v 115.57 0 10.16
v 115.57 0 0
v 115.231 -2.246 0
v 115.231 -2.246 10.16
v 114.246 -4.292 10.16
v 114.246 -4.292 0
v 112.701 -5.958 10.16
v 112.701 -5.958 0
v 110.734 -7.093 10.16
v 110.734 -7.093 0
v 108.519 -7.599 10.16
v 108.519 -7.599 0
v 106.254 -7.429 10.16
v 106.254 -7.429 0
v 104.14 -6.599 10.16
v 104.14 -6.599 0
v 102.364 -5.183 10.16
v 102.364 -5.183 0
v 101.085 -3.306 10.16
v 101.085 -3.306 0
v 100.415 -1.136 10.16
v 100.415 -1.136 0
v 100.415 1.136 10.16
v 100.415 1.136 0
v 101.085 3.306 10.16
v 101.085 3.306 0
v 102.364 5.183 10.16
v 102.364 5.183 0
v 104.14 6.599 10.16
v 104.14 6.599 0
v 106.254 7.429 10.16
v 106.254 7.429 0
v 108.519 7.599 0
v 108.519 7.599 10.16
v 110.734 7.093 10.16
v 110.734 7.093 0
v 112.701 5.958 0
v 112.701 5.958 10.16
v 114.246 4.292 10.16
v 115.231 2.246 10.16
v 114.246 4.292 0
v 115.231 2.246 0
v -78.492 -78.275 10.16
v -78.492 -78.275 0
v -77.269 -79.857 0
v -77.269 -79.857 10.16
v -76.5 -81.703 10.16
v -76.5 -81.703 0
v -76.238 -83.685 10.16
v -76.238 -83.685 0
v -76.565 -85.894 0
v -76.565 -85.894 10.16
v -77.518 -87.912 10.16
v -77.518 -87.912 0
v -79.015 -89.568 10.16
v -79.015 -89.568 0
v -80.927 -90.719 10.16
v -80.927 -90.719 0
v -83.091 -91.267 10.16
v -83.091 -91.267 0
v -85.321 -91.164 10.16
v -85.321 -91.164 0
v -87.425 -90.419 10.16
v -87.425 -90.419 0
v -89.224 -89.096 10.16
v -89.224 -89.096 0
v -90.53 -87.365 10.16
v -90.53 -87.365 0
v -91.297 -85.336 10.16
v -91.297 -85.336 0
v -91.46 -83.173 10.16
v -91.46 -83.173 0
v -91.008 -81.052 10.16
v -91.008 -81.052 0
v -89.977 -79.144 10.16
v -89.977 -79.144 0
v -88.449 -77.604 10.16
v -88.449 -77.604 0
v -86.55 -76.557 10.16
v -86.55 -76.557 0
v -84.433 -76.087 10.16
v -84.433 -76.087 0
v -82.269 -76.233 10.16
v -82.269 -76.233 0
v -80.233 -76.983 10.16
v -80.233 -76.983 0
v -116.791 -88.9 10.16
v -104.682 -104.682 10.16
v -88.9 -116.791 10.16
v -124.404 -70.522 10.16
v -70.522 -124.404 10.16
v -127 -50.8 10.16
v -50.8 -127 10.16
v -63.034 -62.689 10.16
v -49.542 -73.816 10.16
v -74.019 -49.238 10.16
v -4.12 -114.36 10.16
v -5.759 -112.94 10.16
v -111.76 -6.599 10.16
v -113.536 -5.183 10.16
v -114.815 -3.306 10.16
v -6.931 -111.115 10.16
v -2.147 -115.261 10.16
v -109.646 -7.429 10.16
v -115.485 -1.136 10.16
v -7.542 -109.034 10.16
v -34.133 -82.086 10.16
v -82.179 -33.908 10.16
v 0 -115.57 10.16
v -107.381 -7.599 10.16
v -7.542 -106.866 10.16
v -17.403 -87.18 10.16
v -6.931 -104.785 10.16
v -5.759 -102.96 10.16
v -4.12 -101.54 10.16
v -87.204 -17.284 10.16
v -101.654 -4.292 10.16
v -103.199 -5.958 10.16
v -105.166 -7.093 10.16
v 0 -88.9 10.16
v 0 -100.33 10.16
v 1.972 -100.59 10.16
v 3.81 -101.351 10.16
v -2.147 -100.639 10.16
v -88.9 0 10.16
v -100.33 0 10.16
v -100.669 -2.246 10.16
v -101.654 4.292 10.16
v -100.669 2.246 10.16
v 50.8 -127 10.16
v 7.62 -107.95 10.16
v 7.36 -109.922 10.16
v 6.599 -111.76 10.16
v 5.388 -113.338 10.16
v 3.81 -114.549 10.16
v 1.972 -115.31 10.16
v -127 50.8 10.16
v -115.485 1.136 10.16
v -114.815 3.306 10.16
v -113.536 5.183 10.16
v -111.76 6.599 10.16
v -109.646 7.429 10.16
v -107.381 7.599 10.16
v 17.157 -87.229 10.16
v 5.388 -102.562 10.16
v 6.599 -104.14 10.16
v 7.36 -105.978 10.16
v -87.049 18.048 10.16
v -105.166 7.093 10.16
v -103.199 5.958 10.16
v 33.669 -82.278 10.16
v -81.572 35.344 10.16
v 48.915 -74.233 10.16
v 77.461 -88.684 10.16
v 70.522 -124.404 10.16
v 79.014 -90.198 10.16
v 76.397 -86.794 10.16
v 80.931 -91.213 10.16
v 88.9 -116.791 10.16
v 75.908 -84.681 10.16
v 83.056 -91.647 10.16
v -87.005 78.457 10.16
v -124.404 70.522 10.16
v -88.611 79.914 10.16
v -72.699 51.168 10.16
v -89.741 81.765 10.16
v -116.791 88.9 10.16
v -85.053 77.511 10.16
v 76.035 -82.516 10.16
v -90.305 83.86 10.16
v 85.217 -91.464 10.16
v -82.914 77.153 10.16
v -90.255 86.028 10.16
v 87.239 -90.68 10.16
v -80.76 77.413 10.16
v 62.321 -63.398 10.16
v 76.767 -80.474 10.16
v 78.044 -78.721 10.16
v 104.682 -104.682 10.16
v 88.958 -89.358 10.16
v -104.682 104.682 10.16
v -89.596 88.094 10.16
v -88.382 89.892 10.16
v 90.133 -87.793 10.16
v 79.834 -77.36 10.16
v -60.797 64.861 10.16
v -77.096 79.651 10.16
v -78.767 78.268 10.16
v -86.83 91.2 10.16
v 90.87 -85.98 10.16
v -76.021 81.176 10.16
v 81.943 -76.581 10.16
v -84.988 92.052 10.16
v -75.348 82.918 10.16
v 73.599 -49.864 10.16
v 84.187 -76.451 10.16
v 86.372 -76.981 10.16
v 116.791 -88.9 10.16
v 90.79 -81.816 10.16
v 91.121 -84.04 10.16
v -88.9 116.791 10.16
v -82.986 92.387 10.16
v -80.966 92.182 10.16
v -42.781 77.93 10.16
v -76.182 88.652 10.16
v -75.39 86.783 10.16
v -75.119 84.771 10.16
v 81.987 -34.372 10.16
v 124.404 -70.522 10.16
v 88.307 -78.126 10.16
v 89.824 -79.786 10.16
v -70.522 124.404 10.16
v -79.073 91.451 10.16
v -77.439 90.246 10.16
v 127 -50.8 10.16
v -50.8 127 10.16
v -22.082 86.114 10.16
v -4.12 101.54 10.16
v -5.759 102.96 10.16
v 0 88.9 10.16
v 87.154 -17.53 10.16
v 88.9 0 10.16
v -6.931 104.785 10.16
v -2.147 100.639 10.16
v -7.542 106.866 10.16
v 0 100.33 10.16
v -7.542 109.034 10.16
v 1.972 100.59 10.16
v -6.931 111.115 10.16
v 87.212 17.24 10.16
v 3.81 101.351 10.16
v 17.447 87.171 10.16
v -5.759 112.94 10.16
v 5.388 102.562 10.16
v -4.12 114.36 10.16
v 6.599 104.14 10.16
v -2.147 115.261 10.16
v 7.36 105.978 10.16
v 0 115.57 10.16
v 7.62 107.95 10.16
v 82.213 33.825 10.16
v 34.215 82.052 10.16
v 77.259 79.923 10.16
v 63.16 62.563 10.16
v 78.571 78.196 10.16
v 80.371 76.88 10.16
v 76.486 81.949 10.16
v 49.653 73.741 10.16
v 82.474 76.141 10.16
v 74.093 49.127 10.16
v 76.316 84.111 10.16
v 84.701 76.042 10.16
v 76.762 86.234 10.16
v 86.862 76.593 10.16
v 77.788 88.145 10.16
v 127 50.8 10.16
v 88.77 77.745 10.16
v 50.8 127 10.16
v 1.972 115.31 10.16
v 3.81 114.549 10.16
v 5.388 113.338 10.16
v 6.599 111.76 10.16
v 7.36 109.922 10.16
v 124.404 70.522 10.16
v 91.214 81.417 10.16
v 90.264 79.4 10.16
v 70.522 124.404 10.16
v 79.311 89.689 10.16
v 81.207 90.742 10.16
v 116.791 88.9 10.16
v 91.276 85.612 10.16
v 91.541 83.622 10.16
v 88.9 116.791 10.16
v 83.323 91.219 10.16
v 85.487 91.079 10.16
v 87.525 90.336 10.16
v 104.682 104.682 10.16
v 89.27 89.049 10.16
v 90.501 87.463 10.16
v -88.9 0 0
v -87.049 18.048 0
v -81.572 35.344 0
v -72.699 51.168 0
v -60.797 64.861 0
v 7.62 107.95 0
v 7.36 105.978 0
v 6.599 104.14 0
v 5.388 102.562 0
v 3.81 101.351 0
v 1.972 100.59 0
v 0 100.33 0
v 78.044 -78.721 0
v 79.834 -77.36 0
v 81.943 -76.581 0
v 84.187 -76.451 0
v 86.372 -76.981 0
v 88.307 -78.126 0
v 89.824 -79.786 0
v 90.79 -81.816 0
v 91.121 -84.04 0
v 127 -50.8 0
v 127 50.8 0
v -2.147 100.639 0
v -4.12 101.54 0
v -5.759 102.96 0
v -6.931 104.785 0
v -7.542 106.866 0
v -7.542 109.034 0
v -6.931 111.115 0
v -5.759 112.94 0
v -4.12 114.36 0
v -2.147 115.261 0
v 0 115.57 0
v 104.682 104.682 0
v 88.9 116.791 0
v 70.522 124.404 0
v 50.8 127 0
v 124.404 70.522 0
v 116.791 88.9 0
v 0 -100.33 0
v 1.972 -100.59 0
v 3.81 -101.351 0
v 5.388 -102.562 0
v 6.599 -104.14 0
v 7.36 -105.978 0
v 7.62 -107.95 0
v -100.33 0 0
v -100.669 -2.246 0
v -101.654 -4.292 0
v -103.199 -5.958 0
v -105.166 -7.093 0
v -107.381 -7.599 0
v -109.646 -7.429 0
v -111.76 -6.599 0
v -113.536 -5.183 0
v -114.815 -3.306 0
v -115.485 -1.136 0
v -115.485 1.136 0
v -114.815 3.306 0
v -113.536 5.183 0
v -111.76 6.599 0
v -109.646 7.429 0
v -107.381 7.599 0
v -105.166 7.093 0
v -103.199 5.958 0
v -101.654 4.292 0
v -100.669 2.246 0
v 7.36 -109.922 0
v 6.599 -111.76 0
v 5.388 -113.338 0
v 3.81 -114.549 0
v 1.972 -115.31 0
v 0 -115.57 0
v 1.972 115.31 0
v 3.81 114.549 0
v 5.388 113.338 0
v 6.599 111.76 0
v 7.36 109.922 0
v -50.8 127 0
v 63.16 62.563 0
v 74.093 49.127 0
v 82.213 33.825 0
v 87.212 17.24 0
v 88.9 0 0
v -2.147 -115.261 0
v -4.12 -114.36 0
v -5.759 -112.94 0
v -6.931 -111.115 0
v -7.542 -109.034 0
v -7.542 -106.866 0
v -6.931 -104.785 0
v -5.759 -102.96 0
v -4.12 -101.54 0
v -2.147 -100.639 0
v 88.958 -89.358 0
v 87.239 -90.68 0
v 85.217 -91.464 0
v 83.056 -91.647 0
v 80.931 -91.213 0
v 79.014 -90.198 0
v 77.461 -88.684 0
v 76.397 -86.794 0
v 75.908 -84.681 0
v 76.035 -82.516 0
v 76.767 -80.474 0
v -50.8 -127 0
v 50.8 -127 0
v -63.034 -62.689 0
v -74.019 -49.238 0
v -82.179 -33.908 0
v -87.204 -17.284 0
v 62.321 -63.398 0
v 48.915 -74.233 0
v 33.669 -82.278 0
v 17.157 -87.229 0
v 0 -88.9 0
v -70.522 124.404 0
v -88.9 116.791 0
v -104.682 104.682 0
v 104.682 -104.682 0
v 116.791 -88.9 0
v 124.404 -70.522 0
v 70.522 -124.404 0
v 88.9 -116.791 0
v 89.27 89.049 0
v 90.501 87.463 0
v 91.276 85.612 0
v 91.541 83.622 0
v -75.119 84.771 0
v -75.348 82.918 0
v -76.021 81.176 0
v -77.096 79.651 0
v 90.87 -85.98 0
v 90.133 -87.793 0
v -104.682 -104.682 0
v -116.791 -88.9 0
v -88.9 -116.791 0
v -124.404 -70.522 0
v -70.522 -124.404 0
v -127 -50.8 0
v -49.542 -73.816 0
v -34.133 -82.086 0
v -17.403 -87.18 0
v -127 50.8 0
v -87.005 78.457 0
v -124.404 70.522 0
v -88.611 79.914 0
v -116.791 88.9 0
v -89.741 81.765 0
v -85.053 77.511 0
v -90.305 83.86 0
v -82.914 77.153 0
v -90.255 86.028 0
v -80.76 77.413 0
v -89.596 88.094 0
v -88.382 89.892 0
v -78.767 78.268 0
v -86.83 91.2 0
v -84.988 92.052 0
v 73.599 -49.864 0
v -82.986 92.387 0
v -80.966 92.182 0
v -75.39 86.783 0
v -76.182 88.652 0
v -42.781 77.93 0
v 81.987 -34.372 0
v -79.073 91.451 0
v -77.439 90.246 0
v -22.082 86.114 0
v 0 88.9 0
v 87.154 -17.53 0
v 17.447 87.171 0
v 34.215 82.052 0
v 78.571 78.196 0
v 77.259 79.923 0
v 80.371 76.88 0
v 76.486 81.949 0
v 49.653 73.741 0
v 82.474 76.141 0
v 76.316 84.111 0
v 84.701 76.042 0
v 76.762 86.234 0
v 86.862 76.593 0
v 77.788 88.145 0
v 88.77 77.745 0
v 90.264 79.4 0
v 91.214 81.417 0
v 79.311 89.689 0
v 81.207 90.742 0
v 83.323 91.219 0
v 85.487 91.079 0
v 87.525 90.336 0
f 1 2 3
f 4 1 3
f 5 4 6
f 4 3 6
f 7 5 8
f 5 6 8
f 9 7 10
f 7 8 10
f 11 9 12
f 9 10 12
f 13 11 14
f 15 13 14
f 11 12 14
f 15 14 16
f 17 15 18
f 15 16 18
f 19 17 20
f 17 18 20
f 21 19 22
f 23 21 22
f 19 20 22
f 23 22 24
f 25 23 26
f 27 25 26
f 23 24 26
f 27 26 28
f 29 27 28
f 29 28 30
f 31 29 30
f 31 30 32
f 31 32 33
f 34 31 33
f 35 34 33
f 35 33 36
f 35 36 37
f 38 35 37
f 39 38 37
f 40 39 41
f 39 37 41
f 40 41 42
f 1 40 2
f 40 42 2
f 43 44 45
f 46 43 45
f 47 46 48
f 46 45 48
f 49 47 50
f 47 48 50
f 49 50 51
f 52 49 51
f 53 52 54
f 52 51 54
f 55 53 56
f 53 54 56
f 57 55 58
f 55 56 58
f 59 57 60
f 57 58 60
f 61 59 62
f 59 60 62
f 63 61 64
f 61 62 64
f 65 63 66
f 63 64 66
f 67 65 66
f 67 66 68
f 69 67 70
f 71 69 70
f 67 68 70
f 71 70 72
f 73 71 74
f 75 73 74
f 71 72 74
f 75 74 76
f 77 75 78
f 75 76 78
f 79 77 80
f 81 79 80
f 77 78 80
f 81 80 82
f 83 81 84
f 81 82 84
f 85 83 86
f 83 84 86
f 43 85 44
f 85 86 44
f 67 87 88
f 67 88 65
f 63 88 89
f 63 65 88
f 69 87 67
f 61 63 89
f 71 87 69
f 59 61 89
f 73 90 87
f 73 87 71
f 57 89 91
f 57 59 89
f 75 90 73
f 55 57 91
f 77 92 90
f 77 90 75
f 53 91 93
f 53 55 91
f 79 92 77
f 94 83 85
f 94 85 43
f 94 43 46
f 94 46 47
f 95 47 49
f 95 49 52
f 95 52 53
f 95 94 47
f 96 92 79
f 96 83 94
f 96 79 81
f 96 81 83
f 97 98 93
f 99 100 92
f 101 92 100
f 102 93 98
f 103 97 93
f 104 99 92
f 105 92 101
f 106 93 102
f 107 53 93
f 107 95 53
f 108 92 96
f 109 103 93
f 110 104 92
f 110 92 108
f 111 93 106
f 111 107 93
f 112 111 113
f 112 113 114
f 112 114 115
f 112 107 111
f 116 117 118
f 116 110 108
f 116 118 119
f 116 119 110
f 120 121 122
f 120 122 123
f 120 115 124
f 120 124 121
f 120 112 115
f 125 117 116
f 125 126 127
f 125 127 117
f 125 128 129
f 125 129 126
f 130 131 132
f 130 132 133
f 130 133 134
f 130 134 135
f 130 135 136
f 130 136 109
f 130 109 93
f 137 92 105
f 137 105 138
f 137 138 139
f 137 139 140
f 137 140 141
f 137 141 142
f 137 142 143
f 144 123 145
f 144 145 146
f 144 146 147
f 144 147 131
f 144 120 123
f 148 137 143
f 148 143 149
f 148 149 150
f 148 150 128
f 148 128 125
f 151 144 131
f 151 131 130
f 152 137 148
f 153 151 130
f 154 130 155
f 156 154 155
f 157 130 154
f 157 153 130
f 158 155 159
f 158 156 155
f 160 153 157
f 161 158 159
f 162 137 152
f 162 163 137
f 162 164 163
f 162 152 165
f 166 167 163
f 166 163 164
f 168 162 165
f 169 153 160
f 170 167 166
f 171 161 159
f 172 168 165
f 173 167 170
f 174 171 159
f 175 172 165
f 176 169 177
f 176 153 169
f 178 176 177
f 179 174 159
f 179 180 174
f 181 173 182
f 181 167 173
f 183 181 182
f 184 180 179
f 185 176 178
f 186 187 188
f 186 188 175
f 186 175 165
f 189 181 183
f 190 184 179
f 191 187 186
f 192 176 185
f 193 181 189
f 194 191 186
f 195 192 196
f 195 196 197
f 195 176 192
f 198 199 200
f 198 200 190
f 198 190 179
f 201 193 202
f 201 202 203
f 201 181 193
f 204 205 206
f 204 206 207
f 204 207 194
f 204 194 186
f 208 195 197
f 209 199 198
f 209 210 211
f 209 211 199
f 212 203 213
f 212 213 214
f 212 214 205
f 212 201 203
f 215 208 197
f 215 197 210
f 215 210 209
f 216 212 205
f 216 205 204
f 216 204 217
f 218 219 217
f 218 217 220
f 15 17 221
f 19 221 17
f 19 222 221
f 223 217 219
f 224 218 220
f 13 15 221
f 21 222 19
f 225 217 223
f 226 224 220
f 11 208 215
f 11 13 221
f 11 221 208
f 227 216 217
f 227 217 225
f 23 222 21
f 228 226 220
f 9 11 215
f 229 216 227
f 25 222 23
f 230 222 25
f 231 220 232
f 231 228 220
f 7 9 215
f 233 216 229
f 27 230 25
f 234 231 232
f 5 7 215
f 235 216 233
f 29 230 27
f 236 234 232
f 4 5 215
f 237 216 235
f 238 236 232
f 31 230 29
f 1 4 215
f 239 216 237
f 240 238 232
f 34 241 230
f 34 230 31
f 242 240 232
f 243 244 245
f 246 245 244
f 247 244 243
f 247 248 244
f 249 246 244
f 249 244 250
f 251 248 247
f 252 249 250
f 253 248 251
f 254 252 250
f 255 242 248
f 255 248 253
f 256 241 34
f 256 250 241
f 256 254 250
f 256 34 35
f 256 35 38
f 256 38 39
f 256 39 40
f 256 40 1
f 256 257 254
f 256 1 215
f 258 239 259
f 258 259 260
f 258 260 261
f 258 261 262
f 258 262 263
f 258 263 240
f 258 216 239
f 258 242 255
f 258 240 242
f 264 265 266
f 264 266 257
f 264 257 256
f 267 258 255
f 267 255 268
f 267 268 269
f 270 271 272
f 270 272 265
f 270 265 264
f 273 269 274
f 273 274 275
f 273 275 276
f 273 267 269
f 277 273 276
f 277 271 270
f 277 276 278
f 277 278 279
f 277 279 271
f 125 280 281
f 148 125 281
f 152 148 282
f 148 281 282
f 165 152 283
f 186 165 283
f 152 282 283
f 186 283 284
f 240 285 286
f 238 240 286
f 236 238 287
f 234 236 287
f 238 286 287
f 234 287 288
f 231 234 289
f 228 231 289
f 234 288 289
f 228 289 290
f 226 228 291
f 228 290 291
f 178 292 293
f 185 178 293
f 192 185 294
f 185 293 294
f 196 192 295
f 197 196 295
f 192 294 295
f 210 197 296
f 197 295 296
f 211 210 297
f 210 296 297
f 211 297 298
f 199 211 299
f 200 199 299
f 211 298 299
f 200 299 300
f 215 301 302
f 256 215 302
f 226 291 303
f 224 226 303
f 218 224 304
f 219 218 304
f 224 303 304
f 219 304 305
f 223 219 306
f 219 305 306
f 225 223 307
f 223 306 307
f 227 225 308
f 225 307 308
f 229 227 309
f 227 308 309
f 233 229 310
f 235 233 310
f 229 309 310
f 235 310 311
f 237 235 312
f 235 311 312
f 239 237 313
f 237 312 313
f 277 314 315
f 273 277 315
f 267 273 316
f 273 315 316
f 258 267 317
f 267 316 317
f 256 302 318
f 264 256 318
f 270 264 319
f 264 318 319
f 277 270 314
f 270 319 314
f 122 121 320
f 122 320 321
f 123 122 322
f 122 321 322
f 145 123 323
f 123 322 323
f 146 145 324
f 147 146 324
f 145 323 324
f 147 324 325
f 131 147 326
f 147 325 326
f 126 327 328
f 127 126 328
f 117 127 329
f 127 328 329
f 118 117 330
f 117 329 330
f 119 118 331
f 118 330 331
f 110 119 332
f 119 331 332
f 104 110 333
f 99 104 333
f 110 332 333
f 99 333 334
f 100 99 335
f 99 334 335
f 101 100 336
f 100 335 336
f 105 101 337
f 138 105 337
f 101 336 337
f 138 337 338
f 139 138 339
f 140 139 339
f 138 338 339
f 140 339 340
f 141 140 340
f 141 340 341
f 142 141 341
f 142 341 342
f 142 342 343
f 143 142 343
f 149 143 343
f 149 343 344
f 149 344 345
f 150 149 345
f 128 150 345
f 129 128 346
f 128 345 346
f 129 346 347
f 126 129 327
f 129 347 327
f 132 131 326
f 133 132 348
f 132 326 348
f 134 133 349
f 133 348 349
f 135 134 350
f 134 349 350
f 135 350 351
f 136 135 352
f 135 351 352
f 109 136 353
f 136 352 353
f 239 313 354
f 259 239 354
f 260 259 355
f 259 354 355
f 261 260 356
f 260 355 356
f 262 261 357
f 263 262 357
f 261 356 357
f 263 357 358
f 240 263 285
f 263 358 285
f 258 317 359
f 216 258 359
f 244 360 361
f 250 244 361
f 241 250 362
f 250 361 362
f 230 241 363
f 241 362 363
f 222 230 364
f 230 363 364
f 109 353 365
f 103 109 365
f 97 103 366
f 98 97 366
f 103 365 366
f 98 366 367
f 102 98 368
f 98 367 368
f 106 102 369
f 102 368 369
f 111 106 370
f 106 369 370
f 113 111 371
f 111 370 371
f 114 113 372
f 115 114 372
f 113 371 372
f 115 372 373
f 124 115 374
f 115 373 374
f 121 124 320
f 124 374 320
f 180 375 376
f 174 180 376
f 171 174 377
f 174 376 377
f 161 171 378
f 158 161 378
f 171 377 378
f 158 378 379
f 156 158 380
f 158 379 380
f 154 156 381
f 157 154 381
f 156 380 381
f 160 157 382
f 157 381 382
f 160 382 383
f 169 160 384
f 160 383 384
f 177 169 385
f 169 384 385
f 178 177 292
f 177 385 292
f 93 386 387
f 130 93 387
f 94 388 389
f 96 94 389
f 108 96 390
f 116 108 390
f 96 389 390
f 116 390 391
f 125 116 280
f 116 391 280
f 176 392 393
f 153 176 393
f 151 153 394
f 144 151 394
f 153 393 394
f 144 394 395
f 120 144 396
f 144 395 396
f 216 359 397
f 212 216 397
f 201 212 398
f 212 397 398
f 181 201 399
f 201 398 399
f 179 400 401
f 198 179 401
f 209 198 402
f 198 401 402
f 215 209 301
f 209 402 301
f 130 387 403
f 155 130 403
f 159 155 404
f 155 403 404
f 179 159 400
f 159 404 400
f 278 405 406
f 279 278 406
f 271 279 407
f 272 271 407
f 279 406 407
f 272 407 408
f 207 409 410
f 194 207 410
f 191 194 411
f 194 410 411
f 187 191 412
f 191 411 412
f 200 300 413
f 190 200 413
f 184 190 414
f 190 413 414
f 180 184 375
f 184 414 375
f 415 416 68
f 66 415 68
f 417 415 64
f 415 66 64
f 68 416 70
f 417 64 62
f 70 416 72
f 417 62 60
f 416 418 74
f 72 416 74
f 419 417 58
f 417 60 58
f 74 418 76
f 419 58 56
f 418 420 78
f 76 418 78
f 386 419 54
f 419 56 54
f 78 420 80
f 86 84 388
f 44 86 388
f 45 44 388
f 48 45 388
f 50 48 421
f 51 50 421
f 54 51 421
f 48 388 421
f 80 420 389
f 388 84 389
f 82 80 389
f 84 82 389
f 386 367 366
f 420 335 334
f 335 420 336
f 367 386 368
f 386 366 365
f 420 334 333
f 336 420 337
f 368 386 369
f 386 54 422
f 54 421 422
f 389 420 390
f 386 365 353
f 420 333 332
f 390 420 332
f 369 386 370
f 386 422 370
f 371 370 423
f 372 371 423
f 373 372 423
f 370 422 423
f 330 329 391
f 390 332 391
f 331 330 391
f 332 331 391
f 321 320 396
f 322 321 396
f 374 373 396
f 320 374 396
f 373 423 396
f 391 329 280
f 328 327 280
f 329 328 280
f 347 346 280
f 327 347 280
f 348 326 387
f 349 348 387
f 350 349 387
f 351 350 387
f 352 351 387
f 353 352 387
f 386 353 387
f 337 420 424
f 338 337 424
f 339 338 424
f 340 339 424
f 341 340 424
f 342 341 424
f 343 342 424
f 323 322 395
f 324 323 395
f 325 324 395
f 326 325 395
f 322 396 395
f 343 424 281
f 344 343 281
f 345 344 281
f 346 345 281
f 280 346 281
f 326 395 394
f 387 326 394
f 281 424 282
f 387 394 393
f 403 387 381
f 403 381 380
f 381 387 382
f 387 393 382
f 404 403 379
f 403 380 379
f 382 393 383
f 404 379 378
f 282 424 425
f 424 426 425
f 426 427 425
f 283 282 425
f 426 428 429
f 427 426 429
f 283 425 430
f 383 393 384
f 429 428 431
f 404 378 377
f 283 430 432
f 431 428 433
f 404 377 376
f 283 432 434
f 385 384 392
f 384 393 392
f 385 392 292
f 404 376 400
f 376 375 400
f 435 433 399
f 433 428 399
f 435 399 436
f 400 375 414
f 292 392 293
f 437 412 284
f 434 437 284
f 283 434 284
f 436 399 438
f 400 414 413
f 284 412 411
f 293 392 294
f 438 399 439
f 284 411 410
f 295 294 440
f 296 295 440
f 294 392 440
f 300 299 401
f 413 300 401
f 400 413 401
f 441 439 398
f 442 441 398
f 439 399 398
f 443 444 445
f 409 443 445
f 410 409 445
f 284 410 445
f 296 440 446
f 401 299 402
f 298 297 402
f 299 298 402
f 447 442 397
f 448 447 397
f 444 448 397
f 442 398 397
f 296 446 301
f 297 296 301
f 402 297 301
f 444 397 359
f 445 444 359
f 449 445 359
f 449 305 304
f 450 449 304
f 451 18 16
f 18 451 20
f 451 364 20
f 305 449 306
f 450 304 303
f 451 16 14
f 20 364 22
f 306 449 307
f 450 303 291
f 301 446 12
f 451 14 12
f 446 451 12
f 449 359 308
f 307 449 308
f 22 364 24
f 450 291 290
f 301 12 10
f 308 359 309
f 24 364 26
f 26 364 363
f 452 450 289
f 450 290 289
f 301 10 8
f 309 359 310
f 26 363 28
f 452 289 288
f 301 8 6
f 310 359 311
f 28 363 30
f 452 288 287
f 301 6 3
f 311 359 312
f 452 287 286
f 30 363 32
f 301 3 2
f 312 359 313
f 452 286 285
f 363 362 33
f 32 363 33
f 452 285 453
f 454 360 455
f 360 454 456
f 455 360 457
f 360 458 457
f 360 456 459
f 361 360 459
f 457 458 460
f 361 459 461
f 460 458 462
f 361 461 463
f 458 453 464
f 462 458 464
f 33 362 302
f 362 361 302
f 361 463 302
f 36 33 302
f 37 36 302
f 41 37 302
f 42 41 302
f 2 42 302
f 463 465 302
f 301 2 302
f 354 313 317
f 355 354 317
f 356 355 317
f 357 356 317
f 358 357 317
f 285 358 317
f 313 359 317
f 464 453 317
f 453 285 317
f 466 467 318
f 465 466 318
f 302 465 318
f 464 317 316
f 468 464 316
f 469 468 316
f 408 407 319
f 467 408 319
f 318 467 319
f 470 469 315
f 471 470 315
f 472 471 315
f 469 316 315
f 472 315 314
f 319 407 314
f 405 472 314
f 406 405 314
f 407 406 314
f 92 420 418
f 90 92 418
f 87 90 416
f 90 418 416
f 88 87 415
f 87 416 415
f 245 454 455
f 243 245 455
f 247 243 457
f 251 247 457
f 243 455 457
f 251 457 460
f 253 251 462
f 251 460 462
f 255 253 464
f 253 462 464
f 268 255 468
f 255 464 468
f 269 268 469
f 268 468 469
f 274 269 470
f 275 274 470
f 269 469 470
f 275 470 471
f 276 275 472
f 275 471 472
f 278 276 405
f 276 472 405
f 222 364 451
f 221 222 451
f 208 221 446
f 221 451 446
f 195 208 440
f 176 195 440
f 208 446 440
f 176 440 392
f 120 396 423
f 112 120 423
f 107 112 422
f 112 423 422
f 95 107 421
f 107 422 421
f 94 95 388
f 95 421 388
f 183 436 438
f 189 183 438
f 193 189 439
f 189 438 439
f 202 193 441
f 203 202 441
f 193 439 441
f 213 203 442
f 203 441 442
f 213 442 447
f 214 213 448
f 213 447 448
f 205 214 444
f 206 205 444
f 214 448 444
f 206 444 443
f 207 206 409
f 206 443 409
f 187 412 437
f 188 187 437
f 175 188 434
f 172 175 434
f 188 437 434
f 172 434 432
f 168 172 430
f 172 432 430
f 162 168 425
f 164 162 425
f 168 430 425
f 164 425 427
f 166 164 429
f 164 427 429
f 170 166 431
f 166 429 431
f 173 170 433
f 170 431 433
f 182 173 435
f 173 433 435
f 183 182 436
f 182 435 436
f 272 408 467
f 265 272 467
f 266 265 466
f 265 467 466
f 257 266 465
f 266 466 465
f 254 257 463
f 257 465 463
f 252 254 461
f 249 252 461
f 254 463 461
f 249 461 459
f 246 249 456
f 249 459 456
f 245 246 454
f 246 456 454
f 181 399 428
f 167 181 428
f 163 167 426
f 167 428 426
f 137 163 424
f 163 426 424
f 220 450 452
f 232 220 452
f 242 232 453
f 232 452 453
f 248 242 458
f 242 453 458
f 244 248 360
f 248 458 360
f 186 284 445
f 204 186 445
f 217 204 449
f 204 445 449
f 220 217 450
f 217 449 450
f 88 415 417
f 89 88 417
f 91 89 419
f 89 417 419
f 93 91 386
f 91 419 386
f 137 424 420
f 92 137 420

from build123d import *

# Parameters (mm, degrees)
F1_DEPTH = 10.16


with BuildPart() as f1:
    # F0 (on Top) → F1 (new body)
    with BuildSketch(Plane.XY):
        with BuildLine():
            Line((-127, 50.8), (-127, 0))
            Line((-127, 0), (-115.57, 0))
            ThreePointArc((-115.57, 0), (-107.95, 7.62), (-100.33, 0))
            Line((-100.33, 0), (-88.9, 0))
            ThreePointArc((-88.9, 0), (-81.572297, 35.343604), (-60.79718, 64.860719))
            Line((-60.79718, 64.860719), (-77.096278, 79.650577))
            ThreePointArc((-77.096278, 79.650577), (-87.859909, 79.128047), (-88.382439, 89.891679))
            Line((-88.382439, 89.891679), (-104.681537, 104.681537))
            ThreePointArc((-104.681537, 104.681537), (-121.19962, 79.960478), (-127, 50.8))
        make_face()
        with BuildLine():
            ThreePointArc((-50.8, 127), (-79.960478, 121.19962), (-104.681537, 104.681537))
            Line((-104.681537, 104.681537), (-88.382439, 89.891679))
            ThreePointArc((-88.382439, 89.891679), (-79.994898, 91.879738), (-75.119358, 84.771128))
            ThreePointArc((-75.119358, 84.771128), (-75.630748, 82.026668), (-77.096278, 79.650577))
            Line((-77.096278, 79.650577), (-60.79718, 64.860719))
            ThreePointArc((-60.79718, 64.860719), (-32.688622, 82.672027), (0, 88.9))
            Line((0, 88.9), (0, 100.33))
            ThreePointArc((0, 100.33), (-7.62, 107.95), (0, 115.57))
            Line((0, 115.57), (0, 127))
            Line((0, 127), (-50.8, 127))
        make_face()
        with BuildLine():
            Line((89.270123, 89.048531), (104.681537, 104.681537))
            ThreePointArc((104.681537, 104.681537), (79.960478, 121.19962), (50.8, 127))
            Line((50.8, 127), (0, 127))
            Line((0, 127), (0, 115.57))
            ThreePointArc((0, 115.57), (5.388154, 113.338154), (7.62, 107.95))
            ThreePointArc((7.62, 107.95), (5.388154, 102.561846), (0, 100.33))
            Line((0, 100.33), (0, 88.9))
            ThreePointArc((0, 88.9), (34.215472, 82.051883), (63.159593, 62.562575))
            Line((63.159593, 62.562575), (78.571008, 78.19558))
            ThreePointArc((78.571008, 78.19558), (78.49409, 88.971613), (89.270123, 89.048531))
        make_face()
        with BuildLine():
            Line((115.57, 0), (127, 0))
            Line((127, 0), (127, 50.8))
            ThreePointArc((127, 50.8), (121.19962, 79.960478), (104.681537, 104.681537))
            Line((104.681537, 104.681537), (89.270123, 89.048531))
            ThreePointArc((89.270123, 89.048531), (90.950075, 86.56321), (91.540565, 83.622056))
            ThreePointArc((91.540565, 83.622056), (86.861719, 76.592545), (78.571008, 78.19558))
            Line((78.571008, 78.19558), (63.159593, 62.562575))
            ThreePointArc((63.159593, 62.562575), (82.213435, 33.82545), (88.9, 0))
            Line((88.9, 0), (100.33, 0))
            ThreePointArc((100.33, 0), (107.95, 7.62), (115.57, 0))
        make_face()
        with BuildLine():
            Line((88.958455, -89.357986), (104.681537, -104.681537))
            ThreePointArc((104.681537, -104.681537), (121.19962, -79.960478), (127, -50.8))
            Line((127, -50.8), (127, 0))
            Line((127, 0), (115.57, 0))
            ThreePointArc((115.57, 0), (107.95, -7.62), (100.33, 0))
            Line((100.33, 0), (88.9, 0))
            ThreePointArc((88.9, 0), (81.986502, -34.371843), (62.321292, -63.397685))
            Line((62.321292, -63.397685), (78.044374, -78.721236))
            ThreePointArc((78.044374, -78.721236), (86.372107, -76.981033), (91.121415, -84.039611))
            ThreePointArc((91.121415, -84.039611), (90.559993, -86.910304), (88.958455, -89.357986))
        make_face()
        with BuildLine():
            Line((0, -115.57), (0, -127))
            Line((0, -127), (50.8, -127))
            ThreePointArc((50.8, -127), (79.960478, -121.19962), (104.681537, -104.681537))
            Line((104.681537, -104.681537), (88.958455, -89.357986))
            ThreePointArc((88.958455, -89.357986), (78.18304, -89.496652), (78.044374, -78.721236))
            Line((78.044374, -78.721236), (62.321292, -63.397685))
            ThreePointArc((62.321292, -63.397685), (33.668648, -82.277774), (0, -88.9))
            Line((0, -88.9), (0, -100.33))
            ThreePointArc((0, -100.33), (5.388154, -102.561846), (7.62, -107.95))
            ThreePointArc((7.62, -107.95), (5.388154, -113.338154), (0, -115.57))
        make_face()
        with BuildLine():
            ThreePointArc((-104.681537, -104.681537), (-79.960478, -121.19962), (-50.8, -127))
            Line((-50.8, -127), (0, -127))
            Line((0, -127), (0, -115.57))
            ThreePointArc((0, -115.57), (-7.62, -107.95), (0, -100.33))
            Line((0, -100.33), (0, -88.9))
            ThreePointArc((0, -88.9), (-34.133071, -82.086195), (-63.033834, -62.689279))
            Line((-63.033834, -62.689279), (-78.491774, -78.275104))
            ThreePointArc((-78.491774, -78.275104), (-76.823745, -80.754866), (-76.237686, -83.685408))
            ThreePointArc((-76.237686, -83.685408), (-80.927144, -90.719349), (-89.223597, -89.095712))
            Line((-89.223597, -89.095712), (-104.681537, -104.681537))
        make_face()
        with BuildLine():
            ThreePointArc((-127, -50.8), (-121.19962, -79.960478), (-104.681537, -104.681537))
            Line((-104.681537, -104.681537), (-89.223597, -89.095712))
            ThreePointArc((-89.223597, -89.095712), (-89.26799, -78.319496), (-78.491774, -78.275104))
            Line((-78.491774, -78.275104), (-63.033834, -62.689279))
            ThreePointArc((-63.033834, -62.689279), (-82.179431, -33.907979), (-88.9, 0))
            Line((-88.9, 0), (-100.33, 0))
            ThreePointArc((-100.33, 0), (-107.95, -7.62), (-115.57, 0))
            Line((-115.57, 0), (-127, 0))
            Line((-127, 0), (-127, -50.8))
        make_face()
    extrude(amount=F1_DEPTH)


solid = f1.part
